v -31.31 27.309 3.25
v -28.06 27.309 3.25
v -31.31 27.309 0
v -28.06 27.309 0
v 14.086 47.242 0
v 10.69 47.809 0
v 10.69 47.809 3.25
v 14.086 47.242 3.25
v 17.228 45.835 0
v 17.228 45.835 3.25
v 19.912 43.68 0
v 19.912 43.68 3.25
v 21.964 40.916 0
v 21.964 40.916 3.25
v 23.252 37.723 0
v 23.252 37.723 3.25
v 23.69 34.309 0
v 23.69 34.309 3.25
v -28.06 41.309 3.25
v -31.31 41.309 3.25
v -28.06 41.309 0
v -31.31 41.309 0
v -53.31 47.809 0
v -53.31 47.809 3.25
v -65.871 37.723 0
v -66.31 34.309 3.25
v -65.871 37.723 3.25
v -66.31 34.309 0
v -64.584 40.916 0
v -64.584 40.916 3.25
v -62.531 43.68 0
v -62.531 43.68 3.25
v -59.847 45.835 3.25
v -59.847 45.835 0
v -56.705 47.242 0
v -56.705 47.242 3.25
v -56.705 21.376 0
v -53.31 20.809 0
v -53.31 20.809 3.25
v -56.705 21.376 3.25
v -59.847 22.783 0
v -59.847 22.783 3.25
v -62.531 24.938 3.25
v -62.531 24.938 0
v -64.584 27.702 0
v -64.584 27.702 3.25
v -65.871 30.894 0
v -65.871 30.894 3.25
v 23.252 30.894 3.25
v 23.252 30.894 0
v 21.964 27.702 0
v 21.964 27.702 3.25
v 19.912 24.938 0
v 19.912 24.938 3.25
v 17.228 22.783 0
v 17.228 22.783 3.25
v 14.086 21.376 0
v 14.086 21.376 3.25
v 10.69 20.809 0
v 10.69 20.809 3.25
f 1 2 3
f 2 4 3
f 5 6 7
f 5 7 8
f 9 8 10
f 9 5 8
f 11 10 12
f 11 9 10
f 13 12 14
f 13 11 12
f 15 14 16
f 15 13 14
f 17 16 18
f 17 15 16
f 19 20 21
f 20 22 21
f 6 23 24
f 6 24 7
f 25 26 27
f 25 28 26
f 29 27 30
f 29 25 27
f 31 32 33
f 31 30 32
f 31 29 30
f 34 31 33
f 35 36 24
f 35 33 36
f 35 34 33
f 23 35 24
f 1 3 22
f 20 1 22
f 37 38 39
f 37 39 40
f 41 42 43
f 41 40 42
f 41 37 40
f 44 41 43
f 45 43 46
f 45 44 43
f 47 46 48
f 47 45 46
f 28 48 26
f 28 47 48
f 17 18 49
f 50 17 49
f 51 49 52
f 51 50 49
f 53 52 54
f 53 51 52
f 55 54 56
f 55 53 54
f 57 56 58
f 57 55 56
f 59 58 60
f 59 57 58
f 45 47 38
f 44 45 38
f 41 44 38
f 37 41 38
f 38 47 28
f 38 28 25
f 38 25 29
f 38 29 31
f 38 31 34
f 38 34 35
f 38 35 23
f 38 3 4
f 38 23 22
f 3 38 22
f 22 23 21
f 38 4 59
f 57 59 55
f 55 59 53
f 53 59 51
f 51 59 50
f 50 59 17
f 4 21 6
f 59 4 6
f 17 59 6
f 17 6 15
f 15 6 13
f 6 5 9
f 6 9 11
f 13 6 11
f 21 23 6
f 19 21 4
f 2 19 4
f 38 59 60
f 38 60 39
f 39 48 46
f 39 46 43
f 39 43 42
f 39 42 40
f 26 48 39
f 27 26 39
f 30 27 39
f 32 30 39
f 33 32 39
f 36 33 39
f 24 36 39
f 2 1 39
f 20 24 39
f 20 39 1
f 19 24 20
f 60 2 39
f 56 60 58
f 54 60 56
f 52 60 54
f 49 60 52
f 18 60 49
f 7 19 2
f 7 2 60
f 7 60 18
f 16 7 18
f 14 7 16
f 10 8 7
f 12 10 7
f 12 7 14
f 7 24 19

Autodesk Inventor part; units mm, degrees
ref_plane "YZ Plane" through (0, 0, 0) normal (1, 0, 0) x (0, 1, 0)
ref_plane "XZ Plane" through (0, 0, 0) normal (0, 1, 0) x (-1, 0, 0)
ref_plane "XY Plane" through (0, 0, 0) normal (0, 0, 1) x (1, 0, 0)
sketch "Block1" plane through (0, 0, 0) normal (0, 0, 1) x (1, 0, 0)
  circle A0 centre (74.029, 24.2723) radius 1
  line L0 (49.279, 30.4723) -> (71.779, 30.4723)
  line L1 (71.779, 30.4723) -> (71.779, 18.0723)
  line L2 (71.779, 18.0723) -> (49.279, 18.0723)
  line L3 (49.279, 18.0723) -> (49.279, 30.4723)
  line L4 (49.279, 30.4723) -> (44.779, 30.4723)
  line L5 (44.779, 30.4723) -> (44.779, 18.0723)
  line L6 (44.779, 18.0723) -> (49.279, 18.0723)
  line L7 (49.279, 18.0723) -> (49.279, 30.4723)
  line L8 (71.779, 30.4723) -> (76.279, 30.4723)
  line L9 (76.279, 30.4723) -> (76.279, 18.0723)
  line L10 (76.279, 18.0723) -> (71.779, 18.0723)
  line L11 (71.779, 18.0723) -> (71.779, 30.4723)
  line L12 (44.779, 24.2723) -> (76.279, 24.2723) construction
  line L13 (47.029, 30.4723) -> (47.029, 18.0723) construction
  circle A1 centre (47.029, 24.2723) radius 1
  line L14 (74.029, 30.4723) -> (74.029, 18.0723) construction
  point P0 (60.979, 24.0984)
  dimension "d7" = 22.5
  dimension "d8" = 12.4
  dimension "d9" = 4.5
  dimension "d10" = 4.5
  dimension "d11" = 2
  dimension "d12" = 2
sketch "Sketch1" plane through (0, 0, 0) normal (0, 0, 1) x (1, 0, 0)
  line L0 (-92.7646, -8.503) -> (-89.7646, -8.503)
  line L1 (-89.7646, -8.503) -> (-89.7646, -11.753)
  line L2 (-89.7646, -11.753) -> (-92.7646, -11.753)
  line L3 (-92.7646, -11.753) -> (-92.7646, -8.503)
  line L4 (-92.7646, -21.6527) -> (-89.7646, -21.6527)
  line L5 (-89.7646, -21.6527) -> (-89.7646, -21.7527)
  line L6 (-89.7646, -21.7527) -> (-92.7646, -21.7527)
  line L7 (-92.7646, -21.7527) -> (-92.7646, -21.6527)
  line L8 (-66.3097, 47.8088) -> (23.6903, 47.8088)
  line L9 (23.6903, 47.8088) -> (23.6903, 20.8088)
  line L10 (23.6903, 20.8088) -> (-66.3097, 20.8088)
  line L11 (-66.3097, 20.8088) -> (-66.3097, 47.8088)
  line L12 (-66.3097, 34.3088) -> (23.6903, 34.3088) construction
  line L13 (-31.3097, 41.3088) -> (-28.0597, 41.3088)
  line L14 (-28.0597, 41.3088) -> (-28.0597, 27.3088)
  line L15 (-28.0597, 27.3088) -> (-31.3097, 27.3088)
  line L16 (-31.3097, 27.3088) -> (-31.3097, 41.3088)
  line L17 (-31.3097, 34.3088) -> (-28.0597, 34.3088) construction
  line L18 (-53.3097, 47.8088) -> (-53.3097, 20.8088) construction
  line L19 (-21.3097, 47.8088) -> (-21.3097, 20.8088) construction
  line L20 (10.6903, 47.8088) -> (10.6903, 20.8088) construction
  arc A0 (-53.3097, 47.8088) -> (-53.3097, 20.8088) centre (-52.8001, 34.3088) ccw
  arc A1 (10.6903, 20.8088) -> (10.6903, 47.8088) centre (10.1806, 34.3088) ccw
  point P0 (0, 0)
  dimension "d0" = 3
  dimension "mat" = 3.25
  dimension "d2" = 3
  dimension "d3" = 0.1
  dimension "d23" = 90
  dimension "d24" = 27
  dimension "d29" = 3.25
  dimension "d30" = 14
  dimension "d31" = 35
  dimension "d36" = 13
  dimension "d38" = 13
extrude "Extrusion5" add sketch "Sketch1" along normal blind 3.25 contours L8 A1 L10 A0
equation "\"d29\" = mat"
equation "\"d42\" = mat"
properties part number "arm-servo"
